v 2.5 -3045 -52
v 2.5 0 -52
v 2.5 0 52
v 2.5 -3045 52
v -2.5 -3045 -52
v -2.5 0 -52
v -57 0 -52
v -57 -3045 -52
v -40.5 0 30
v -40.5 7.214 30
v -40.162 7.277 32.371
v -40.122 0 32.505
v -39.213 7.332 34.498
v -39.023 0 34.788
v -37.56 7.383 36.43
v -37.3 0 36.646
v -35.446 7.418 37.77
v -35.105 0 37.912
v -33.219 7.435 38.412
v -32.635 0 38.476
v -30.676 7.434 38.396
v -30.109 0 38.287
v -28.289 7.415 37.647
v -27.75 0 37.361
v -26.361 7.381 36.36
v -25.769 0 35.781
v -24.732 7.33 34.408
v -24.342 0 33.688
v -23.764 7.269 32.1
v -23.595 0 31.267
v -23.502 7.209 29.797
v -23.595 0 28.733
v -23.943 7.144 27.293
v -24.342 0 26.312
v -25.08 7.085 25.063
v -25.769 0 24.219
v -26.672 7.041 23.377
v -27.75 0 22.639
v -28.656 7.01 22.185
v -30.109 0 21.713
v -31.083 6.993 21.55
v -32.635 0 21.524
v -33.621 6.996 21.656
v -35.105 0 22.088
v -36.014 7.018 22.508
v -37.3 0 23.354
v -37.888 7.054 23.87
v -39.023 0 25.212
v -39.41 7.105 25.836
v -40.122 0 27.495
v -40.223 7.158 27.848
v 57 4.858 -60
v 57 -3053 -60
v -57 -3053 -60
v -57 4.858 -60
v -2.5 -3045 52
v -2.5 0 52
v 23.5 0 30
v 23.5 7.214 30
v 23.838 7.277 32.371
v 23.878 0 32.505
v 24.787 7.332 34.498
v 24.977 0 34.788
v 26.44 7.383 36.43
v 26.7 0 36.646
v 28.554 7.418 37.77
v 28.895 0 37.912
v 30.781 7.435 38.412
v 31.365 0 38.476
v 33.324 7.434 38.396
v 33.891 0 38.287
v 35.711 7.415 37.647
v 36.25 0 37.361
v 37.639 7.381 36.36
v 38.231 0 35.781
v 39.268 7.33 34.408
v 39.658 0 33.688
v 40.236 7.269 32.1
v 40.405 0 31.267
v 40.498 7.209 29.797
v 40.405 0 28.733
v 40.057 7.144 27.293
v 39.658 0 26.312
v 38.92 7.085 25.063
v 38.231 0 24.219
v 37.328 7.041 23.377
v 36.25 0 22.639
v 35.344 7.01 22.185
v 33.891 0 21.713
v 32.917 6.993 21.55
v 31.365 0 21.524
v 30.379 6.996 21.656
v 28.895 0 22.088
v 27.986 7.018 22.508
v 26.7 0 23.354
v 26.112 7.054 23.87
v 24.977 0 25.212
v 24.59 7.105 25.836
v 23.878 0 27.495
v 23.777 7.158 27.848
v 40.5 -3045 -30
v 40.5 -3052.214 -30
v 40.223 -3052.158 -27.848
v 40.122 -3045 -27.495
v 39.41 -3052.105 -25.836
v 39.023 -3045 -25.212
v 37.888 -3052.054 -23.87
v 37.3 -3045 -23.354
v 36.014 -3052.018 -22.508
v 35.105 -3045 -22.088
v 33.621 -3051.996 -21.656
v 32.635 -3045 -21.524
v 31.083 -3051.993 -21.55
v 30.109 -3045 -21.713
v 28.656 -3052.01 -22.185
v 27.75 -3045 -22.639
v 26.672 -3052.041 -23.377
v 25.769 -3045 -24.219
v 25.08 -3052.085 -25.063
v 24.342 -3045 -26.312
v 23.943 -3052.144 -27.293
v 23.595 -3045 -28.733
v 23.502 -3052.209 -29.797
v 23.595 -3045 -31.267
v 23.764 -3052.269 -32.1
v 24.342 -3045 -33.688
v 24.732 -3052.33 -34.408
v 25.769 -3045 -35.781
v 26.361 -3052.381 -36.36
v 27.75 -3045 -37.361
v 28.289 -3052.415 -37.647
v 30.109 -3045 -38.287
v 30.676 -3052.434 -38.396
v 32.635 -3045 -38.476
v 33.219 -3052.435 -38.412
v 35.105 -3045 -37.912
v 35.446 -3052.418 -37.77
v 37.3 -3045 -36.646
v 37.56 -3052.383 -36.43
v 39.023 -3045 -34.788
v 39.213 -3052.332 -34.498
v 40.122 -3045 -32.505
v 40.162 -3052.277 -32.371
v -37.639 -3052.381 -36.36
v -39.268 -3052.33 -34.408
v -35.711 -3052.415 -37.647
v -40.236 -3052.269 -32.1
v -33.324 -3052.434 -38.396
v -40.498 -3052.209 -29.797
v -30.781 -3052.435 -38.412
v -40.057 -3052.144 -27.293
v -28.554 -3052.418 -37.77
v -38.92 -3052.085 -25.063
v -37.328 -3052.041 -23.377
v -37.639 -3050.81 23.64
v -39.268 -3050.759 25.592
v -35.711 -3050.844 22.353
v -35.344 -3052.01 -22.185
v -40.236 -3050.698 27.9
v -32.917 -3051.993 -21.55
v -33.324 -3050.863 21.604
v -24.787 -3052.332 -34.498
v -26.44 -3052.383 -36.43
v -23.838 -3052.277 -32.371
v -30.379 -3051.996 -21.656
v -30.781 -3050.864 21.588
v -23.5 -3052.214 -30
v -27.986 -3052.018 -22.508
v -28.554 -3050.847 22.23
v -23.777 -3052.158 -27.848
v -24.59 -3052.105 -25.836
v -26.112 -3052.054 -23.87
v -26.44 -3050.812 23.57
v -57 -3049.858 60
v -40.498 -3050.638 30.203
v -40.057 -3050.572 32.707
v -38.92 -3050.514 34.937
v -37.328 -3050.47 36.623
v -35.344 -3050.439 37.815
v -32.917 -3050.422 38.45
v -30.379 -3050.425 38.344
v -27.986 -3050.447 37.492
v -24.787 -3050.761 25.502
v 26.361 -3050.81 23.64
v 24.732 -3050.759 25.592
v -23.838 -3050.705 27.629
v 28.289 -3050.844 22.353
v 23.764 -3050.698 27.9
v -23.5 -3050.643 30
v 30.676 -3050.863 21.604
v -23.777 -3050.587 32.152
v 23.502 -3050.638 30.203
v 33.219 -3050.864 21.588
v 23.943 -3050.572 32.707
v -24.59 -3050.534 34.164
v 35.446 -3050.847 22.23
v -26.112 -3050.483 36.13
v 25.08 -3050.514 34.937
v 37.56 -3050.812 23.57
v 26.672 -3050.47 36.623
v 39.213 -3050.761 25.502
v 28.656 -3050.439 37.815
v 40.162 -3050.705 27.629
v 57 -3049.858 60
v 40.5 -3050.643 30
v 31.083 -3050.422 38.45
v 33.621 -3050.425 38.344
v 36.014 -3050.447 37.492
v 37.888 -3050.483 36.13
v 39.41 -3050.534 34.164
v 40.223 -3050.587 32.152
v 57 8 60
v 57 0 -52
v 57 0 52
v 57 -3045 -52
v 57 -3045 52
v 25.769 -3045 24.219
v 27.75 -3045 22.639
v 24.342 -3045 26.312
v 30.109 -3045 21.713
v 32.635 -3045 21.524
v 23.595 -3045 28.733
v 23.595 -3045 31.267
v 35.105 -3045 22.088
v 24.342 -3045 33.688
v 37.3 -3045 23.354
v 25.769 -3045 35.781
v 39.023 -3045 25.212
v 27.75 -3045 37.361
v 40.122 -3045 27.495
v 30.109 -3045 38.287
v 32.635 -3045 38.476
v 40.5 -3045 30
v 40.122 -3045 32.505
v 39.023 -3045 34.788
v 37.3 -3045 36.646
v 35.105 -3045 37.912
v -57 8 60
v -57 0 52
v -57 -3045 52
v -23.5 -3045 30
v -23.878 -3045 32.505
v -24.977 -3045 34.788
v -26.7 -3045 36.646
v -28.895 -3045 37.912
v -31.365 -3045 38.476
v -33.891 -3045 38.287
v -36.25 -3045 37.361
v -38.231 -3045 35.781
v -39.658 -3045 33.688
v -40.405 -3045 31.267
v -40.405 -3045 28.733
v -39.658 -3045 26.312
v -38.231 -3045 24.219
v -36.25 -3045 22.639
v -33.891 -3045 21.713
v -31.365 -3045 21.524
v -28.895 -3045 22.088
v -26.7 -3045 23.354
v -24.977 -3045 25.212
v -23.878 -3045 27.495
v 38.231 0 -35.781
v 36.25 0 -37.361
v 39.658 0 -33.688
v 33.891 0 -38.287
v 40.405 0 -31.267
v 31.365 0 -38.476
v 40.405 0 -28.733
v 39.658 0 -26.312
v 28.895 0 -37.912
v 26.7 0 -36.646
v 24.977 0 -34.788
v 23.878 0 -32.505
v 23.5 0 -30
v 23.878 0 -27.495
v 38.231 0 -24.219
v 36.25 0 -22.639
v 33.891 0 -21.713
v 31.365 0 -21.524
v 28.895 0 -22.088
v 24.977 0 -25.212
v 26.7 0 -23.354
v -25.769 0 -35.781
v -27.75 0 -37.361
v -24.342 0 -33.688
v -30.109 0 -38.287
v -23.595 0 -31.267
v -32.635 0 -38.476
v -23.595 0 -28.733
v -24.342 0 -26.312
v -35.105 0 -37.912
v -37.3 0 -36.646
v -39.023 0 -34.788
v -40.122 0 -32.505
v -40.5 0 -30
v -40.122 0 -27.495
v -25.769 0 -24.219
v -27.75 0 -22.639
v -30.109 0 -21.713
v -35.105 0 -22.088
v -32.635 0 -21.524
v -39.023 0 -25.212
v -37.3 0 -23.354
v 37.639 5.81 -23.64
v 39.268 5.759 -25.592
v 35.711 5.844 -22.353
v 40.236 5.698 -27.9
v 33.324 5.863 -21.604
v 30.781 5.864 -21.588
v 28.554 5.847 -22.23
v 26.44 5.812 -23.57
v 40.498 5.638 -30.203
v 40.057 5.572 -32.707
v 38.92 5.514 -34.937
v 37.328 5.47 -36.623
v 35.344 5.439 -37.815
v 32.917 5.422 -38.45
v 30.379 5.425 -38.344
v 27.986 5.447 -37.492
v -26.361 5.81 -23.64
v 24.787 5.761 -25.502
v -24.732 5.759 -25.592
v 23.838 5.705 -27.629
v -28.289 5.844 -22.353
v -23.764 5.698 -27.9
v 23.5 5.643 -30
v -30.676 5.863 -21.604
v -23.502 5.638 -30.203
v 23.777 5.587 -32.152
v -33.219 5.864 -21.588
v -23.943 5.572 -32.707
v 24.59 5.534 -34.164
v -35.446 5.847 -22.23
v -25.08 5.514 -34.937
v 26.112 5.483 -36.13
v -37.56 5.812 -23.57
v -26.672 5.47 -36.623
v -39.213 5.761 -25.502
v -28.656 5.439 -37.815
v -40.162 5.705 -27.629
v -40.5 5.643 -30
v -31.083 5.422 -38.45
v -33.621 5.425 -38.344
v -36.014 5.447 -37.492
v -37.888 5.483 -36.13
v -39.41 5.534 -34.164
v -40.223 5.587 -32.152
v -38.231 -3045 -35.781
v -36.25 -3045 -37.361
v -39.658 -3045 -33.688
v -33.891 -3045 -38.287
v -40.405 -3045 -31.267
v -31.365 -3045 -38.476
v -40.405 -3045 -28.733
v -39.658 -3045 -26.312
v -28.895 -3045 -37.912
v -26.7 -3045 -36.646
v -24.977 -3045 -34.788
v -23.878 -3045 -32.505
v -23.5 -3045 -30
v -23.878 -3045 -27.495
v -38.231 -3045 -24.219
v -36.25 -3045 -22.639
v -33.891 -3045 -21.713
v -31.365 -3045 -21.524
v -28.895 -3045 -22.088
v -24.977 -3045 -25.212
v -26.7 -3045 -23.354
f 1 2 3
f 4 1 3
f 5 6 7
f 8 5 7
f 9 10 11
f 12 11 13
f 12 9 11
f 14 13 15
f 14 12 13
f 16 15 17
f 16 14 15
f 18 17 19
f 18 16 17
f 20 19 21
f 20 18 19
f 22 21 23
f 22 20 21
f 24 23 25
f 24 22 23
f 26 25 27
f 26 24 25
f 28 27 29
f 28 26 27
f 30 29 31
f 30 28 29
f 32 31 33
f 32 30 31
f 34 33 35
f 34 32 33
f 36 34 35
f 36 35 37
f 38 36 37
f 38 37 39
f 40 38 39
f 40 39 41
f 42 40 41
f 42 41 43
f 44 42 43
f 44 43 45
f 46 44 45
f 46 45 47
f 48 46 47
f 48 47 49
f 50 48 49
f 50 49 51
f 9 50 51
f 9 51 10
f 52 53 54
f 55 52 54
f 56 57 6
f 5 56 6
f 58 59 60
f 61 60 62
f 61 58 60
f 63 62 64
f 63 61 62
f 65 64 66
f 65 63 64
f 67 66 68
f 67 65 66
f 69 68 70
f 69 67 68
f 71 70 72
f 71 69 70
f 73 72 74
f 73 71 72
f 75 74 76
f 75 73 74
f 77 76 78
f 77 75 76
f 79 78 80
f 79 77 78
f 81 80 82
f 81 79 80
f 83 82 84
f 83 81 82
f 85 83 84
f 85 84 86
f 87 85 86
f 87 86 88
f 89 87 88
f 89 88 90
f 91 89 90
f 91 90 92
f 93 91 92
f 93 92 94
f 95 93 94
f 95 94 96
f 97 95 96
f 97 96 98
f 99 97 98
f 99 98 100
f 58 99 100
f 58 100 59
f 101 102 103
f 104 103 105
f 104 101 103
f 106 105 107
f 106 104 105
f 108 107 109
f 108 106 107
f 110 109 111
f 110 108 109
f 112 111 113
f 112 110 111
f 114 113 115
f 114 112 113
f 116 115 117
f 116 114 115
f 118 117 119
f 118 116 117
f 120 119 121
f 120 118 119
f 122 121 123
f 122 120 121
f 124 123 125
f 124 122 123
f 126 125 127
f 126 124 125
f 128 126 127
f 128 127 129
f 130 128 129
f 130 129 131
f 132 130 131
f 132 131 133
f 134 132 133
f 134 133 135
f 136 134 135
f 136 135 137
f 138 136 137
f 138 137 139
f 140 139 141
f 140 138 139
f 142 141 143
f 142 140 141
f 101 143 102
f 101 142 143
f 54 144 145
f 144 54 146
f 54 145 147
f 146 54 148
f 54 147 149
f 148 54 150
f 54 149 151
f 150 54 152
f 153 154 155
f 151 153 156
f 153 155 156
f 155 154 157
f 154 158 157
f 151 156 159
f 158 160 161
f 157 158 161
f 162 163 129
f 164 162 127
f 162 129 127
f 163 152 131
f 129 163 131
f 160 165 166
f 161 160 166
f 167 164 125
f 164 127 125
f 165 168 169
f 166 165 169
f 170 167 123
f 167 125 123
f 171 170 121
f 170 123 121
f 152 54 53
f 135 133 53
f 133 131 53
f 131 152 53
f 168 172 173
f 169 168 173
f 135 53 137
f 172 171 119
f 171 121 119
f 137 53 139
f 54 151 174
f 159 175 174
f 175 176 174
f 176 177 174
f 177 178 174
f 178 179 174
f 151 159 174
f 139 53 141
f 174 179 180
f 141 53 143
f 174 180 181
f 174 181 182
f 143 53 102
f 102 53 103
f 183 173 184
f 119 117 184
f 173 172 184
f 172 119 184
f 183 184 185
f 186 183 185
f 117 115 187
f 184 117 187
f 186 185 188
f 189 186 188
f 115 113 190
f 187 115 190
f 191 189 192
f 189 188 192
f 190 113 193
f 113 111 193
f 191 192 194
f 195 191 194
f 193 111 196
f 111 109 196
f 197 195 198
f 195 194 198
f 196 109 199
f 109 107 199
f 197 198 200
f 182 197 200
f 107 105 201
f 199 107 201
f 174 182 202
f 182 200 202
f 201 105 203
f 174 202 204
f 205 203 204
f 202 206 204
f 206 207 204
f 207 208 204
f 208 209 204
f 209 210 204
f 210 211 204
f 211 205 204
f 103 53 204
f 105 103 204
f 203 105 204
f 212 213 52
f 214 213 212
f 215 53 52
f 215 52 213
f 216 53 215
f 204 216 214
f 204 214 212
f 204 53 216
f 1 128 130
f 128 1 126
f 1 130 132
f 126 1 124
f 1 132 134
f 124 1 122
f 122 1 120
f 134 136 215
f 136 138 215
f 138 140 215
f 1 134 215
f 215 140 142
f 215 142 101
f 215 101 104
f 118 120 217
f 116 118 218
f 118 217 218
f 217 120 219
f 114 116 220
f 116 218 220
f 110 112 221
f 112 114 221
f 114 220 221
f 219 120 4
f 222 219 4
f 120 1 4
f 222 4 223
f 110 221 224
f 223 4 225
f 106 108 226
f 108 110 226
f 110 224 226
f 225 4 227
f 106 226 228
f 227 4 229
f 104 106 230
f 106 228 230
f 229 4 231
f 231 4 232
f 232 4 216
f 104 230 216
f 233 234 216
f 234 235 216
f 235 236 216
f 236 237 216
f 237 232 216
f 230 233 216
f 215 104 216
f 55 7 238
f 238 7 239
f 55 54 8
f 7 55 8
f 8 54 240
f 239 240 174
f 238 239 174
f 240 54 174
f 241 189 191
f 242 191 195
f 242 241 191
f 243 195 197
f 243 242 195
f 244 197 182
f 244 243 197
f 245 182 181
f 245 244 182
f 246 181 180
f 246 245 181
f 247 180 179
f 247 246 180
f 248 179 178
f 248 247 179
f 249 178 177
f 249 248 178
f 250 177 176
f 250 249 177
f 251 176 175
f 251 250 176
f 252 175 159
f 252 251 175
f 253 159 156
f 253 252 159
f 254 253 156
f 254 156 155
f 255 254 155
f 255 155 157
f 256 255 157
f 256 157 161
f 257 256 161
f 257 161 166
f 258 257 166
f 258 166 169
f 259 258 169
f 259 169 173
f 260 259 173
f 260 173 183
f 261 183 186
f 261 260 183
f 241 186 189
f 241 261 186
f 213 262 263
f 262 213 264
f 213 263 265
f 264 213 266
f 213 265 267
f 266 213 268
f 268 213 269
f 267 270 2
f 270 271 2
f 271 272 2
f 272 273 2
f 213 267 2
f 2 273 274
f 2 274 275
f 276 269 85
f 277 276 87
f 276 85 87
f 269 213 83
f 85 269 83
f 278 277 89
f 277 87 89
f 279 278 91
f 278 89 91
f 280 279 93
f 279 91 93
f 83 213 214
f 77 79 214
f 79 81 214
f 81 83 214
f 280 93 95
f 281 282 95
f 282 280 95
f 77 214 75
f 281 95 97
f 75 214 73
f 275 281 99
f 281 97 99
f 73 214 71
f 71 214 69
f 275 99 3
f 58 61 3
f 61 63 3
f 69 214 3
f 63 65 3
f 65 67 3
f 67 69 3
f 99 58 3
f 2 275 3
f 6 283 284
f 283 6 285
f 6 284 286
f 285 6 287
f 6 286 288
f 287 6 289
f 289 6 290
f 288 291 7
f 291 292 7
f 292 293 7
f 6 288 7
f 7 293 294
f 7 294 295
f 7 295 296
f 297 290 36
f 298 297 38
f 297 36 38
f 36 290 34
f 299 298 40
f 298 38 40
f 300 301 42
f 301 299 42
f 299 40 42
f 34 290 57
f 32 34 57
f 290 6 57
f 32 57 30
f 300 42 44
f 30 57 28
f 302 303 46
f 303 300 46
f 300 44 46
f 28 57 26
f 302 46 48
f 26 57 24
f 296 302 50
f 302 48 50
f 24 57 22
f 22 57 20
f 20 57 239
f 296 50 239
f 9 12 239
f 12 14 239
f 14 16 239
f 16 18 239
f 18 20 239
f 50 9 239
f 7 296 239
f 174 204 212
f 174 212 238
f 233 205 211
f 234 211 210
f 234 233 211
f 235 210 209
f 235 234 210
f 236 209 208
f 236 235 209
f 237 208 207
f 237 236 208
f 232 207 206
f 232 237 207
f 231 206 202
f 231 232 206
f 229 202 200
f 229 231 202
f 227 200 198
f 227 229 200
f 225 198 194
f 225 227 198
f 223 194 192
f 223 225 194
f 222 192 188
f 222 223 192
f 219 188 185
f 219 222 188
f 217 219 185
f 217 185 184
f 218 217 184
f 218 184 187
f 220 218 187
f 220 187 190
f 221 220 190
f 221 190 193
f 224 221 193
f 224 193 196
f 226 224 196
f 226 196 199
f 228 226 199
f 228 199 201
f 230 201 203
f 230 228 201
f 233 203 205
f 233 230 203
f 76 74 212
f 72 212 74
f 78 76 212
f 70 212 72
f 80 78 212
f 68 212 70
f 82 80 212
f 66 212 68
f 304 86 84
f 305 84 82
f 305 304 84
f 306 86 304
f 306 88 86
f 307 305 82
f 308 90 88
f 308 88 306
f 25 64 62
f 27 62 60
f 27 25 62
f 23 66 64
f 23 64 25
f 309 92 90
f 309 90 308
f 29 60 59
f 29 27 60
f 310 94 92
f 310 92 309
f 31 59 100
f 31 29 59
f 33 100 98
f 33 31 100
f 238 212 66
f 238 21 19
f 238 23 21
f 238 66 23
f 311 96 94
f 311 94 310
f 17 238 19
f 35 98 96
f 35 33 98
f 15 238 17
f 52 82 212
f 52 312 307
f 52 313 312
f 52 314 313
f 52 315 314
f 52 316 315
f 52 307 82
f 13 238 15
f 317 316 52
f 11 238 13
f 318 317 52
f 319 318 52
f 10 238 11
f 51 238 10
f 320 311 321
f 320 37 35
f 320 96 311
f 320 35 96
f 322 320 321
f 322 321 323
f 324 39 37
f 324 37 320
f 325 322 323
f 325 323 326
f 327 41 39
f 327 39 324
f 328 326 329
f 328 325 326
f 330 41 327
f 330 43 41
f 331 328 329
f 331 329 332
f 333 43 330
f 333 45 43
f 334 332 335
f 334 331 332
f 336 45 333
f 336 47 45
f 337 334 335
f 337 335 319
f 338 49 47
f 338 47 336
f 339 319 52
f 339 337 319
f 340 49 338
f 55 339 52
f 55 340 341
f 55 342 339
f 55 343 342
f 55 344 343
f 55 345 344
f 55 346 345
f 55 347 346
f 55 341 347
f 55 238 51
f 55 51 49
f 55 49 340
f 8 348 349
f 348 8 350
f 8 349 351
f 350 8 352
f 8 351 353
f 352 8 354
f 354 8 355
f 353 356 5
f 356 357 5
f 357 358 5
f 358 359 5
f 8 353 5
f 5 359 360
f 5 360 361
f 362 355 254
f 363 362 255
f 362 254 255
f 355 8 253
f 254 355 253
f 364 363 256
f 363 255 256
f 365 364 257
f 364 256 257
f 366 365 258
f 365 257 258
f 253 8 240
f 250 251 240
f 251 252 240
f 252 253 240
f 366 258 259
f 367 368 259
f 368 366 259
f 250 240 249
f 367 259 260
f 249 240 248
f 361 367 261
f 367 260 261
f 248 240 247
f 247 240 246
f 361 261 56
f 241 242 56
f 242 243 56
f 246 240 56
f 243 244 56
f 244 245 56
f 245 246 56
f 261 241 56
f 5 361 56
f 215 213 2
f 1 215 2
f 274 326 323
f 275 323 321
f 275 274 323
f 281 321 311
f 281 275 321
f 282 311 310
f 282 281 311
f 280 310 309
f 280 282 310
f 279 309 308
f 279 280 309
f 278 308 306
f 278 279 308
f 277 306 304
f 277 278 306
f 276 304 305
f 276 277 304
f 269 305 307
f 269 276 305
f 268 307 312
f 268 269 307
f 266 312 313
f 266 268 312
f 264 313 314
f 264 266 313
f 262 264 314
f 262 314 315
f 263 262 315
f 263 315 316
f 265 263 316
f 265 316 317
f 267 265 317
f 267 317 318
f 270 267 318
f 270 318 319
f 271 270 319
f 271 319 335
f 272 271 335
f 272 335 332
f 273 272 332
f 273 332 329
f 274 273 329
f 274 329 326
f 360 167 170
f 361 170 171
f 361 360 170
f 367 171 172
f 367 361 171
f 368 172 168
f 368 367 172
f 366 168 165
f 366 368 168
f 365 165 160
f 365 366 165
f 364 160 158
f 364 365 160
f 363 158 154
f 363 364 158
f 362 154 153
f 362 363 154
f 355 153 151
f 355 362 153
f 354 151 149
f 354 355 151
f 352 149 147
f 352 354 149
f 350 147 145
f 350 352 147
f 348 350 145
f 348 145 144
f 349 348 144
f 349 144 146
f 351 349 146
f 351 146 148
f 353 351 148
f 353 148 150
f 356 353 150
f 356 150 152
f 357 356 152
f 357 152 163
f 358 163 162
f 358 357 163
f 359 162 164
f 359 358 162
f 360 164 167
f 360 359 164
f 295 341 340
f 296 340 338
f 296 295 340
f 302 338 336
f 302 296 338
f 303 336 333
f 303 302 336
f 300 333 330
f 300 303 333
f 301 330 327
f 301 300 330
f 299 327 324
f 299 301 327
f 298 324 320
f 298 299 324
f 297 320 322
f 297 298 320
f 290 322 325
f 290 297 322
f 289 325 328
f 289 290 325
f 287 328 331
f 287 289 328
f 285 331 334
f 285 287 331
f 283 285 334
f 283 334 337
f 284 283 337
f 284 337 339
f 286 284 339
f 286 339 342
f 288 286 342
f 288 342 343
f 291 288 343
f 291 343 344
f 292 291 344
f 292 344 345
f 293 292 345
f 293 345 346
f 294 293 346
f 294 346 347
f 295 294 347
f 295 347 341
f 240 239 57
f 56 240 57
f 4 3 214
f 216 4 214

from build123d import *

# Parameters (mm, degrees)
F1_DEPTH = 3045
F2_W     = 114
F2_H     = 120
F2_R     = 8.5
F3_DEPTH = 8
F4_W     = 114
F4_H     = 120
F4_R     = 8.5
F5_DEPTH = 8
F7_DEPTH = 75


with BuildPart() as f1:
    # F0 (on Front) → F1 (new body)
    with BuildSketch(Plane.XZ):
        Polygon((57, 60), (0, 60), (-57, 60), (-57, 52), (-2.5, 52), (-2.5, 0), (-2.5, -52), (-57, -52), (-57, -60), (0, -60), (57, -60), (57, -52), (2.5, -52), (2.5, 0), (2.5, 52), (57, 52), align=None)
    extrude(amount=F1_DEPTH)

    # F2 (on face) → F3 (join)
    with BuildSketch(Plane.XZ.offset(3045)):
        Rectangle(F2_W, F2_H)
        with Locations((-32, -30)):
            Circle(F2_R, mode=Mode.SUBTRACT)
        with Locations((32, -30)):
            Circle(F2_R, mode=Mode.SUBTRACT)
        with Locations((-32, 30)):
            Circle(F2_R, mode=Mode.SUBTRACT)
        with Locations((32, 30)):
            Circle(F2_R, mode=Mode.SUBTRACT)
    extrude(amount=F3_DEPTH)

    # F4 (on face) → F5 (join)
    with BuildSketch(Plane(origin=(0, 0, 0), x_dir=(-1, 0, 0), z_dir=(0, 1, 0))):
        Rectangle(F4_W, F4_H)
        with Locations((-32, -30)):
            Circle(F4_R, mode=Mode.SUBTRACT)
        with Locations((32, -30)):
            Circle(F4_R, mode=Mode.SUBTRACT)
        with Locations((-32, 30)):
            Circle(F4_R, mode=Mode.SUBTRACT)
        with Locations((32, 30)):
            Circle(F4_R, mode=Mode.SUBTRACT)
    extrude(amount=F5_DEPTH)

    # F6 (on Right) → F7 (cut, symmetric)
    with BuildSketch(Plane.YZ):
        Polygon((32.1637574417, -60), (32.1637574417, 60), (8, 60), (4.8576894117, -60), align=None)
        Polygon((-3053, -60), (-3049.8576894117, 60), (-3064.5062300981, 60), (-3064.5062300981, -60), align=None)
    extrude(amount=F7_DEPTH, both=True, mode=Mode.SUBTRACT)


solid = f1.part
